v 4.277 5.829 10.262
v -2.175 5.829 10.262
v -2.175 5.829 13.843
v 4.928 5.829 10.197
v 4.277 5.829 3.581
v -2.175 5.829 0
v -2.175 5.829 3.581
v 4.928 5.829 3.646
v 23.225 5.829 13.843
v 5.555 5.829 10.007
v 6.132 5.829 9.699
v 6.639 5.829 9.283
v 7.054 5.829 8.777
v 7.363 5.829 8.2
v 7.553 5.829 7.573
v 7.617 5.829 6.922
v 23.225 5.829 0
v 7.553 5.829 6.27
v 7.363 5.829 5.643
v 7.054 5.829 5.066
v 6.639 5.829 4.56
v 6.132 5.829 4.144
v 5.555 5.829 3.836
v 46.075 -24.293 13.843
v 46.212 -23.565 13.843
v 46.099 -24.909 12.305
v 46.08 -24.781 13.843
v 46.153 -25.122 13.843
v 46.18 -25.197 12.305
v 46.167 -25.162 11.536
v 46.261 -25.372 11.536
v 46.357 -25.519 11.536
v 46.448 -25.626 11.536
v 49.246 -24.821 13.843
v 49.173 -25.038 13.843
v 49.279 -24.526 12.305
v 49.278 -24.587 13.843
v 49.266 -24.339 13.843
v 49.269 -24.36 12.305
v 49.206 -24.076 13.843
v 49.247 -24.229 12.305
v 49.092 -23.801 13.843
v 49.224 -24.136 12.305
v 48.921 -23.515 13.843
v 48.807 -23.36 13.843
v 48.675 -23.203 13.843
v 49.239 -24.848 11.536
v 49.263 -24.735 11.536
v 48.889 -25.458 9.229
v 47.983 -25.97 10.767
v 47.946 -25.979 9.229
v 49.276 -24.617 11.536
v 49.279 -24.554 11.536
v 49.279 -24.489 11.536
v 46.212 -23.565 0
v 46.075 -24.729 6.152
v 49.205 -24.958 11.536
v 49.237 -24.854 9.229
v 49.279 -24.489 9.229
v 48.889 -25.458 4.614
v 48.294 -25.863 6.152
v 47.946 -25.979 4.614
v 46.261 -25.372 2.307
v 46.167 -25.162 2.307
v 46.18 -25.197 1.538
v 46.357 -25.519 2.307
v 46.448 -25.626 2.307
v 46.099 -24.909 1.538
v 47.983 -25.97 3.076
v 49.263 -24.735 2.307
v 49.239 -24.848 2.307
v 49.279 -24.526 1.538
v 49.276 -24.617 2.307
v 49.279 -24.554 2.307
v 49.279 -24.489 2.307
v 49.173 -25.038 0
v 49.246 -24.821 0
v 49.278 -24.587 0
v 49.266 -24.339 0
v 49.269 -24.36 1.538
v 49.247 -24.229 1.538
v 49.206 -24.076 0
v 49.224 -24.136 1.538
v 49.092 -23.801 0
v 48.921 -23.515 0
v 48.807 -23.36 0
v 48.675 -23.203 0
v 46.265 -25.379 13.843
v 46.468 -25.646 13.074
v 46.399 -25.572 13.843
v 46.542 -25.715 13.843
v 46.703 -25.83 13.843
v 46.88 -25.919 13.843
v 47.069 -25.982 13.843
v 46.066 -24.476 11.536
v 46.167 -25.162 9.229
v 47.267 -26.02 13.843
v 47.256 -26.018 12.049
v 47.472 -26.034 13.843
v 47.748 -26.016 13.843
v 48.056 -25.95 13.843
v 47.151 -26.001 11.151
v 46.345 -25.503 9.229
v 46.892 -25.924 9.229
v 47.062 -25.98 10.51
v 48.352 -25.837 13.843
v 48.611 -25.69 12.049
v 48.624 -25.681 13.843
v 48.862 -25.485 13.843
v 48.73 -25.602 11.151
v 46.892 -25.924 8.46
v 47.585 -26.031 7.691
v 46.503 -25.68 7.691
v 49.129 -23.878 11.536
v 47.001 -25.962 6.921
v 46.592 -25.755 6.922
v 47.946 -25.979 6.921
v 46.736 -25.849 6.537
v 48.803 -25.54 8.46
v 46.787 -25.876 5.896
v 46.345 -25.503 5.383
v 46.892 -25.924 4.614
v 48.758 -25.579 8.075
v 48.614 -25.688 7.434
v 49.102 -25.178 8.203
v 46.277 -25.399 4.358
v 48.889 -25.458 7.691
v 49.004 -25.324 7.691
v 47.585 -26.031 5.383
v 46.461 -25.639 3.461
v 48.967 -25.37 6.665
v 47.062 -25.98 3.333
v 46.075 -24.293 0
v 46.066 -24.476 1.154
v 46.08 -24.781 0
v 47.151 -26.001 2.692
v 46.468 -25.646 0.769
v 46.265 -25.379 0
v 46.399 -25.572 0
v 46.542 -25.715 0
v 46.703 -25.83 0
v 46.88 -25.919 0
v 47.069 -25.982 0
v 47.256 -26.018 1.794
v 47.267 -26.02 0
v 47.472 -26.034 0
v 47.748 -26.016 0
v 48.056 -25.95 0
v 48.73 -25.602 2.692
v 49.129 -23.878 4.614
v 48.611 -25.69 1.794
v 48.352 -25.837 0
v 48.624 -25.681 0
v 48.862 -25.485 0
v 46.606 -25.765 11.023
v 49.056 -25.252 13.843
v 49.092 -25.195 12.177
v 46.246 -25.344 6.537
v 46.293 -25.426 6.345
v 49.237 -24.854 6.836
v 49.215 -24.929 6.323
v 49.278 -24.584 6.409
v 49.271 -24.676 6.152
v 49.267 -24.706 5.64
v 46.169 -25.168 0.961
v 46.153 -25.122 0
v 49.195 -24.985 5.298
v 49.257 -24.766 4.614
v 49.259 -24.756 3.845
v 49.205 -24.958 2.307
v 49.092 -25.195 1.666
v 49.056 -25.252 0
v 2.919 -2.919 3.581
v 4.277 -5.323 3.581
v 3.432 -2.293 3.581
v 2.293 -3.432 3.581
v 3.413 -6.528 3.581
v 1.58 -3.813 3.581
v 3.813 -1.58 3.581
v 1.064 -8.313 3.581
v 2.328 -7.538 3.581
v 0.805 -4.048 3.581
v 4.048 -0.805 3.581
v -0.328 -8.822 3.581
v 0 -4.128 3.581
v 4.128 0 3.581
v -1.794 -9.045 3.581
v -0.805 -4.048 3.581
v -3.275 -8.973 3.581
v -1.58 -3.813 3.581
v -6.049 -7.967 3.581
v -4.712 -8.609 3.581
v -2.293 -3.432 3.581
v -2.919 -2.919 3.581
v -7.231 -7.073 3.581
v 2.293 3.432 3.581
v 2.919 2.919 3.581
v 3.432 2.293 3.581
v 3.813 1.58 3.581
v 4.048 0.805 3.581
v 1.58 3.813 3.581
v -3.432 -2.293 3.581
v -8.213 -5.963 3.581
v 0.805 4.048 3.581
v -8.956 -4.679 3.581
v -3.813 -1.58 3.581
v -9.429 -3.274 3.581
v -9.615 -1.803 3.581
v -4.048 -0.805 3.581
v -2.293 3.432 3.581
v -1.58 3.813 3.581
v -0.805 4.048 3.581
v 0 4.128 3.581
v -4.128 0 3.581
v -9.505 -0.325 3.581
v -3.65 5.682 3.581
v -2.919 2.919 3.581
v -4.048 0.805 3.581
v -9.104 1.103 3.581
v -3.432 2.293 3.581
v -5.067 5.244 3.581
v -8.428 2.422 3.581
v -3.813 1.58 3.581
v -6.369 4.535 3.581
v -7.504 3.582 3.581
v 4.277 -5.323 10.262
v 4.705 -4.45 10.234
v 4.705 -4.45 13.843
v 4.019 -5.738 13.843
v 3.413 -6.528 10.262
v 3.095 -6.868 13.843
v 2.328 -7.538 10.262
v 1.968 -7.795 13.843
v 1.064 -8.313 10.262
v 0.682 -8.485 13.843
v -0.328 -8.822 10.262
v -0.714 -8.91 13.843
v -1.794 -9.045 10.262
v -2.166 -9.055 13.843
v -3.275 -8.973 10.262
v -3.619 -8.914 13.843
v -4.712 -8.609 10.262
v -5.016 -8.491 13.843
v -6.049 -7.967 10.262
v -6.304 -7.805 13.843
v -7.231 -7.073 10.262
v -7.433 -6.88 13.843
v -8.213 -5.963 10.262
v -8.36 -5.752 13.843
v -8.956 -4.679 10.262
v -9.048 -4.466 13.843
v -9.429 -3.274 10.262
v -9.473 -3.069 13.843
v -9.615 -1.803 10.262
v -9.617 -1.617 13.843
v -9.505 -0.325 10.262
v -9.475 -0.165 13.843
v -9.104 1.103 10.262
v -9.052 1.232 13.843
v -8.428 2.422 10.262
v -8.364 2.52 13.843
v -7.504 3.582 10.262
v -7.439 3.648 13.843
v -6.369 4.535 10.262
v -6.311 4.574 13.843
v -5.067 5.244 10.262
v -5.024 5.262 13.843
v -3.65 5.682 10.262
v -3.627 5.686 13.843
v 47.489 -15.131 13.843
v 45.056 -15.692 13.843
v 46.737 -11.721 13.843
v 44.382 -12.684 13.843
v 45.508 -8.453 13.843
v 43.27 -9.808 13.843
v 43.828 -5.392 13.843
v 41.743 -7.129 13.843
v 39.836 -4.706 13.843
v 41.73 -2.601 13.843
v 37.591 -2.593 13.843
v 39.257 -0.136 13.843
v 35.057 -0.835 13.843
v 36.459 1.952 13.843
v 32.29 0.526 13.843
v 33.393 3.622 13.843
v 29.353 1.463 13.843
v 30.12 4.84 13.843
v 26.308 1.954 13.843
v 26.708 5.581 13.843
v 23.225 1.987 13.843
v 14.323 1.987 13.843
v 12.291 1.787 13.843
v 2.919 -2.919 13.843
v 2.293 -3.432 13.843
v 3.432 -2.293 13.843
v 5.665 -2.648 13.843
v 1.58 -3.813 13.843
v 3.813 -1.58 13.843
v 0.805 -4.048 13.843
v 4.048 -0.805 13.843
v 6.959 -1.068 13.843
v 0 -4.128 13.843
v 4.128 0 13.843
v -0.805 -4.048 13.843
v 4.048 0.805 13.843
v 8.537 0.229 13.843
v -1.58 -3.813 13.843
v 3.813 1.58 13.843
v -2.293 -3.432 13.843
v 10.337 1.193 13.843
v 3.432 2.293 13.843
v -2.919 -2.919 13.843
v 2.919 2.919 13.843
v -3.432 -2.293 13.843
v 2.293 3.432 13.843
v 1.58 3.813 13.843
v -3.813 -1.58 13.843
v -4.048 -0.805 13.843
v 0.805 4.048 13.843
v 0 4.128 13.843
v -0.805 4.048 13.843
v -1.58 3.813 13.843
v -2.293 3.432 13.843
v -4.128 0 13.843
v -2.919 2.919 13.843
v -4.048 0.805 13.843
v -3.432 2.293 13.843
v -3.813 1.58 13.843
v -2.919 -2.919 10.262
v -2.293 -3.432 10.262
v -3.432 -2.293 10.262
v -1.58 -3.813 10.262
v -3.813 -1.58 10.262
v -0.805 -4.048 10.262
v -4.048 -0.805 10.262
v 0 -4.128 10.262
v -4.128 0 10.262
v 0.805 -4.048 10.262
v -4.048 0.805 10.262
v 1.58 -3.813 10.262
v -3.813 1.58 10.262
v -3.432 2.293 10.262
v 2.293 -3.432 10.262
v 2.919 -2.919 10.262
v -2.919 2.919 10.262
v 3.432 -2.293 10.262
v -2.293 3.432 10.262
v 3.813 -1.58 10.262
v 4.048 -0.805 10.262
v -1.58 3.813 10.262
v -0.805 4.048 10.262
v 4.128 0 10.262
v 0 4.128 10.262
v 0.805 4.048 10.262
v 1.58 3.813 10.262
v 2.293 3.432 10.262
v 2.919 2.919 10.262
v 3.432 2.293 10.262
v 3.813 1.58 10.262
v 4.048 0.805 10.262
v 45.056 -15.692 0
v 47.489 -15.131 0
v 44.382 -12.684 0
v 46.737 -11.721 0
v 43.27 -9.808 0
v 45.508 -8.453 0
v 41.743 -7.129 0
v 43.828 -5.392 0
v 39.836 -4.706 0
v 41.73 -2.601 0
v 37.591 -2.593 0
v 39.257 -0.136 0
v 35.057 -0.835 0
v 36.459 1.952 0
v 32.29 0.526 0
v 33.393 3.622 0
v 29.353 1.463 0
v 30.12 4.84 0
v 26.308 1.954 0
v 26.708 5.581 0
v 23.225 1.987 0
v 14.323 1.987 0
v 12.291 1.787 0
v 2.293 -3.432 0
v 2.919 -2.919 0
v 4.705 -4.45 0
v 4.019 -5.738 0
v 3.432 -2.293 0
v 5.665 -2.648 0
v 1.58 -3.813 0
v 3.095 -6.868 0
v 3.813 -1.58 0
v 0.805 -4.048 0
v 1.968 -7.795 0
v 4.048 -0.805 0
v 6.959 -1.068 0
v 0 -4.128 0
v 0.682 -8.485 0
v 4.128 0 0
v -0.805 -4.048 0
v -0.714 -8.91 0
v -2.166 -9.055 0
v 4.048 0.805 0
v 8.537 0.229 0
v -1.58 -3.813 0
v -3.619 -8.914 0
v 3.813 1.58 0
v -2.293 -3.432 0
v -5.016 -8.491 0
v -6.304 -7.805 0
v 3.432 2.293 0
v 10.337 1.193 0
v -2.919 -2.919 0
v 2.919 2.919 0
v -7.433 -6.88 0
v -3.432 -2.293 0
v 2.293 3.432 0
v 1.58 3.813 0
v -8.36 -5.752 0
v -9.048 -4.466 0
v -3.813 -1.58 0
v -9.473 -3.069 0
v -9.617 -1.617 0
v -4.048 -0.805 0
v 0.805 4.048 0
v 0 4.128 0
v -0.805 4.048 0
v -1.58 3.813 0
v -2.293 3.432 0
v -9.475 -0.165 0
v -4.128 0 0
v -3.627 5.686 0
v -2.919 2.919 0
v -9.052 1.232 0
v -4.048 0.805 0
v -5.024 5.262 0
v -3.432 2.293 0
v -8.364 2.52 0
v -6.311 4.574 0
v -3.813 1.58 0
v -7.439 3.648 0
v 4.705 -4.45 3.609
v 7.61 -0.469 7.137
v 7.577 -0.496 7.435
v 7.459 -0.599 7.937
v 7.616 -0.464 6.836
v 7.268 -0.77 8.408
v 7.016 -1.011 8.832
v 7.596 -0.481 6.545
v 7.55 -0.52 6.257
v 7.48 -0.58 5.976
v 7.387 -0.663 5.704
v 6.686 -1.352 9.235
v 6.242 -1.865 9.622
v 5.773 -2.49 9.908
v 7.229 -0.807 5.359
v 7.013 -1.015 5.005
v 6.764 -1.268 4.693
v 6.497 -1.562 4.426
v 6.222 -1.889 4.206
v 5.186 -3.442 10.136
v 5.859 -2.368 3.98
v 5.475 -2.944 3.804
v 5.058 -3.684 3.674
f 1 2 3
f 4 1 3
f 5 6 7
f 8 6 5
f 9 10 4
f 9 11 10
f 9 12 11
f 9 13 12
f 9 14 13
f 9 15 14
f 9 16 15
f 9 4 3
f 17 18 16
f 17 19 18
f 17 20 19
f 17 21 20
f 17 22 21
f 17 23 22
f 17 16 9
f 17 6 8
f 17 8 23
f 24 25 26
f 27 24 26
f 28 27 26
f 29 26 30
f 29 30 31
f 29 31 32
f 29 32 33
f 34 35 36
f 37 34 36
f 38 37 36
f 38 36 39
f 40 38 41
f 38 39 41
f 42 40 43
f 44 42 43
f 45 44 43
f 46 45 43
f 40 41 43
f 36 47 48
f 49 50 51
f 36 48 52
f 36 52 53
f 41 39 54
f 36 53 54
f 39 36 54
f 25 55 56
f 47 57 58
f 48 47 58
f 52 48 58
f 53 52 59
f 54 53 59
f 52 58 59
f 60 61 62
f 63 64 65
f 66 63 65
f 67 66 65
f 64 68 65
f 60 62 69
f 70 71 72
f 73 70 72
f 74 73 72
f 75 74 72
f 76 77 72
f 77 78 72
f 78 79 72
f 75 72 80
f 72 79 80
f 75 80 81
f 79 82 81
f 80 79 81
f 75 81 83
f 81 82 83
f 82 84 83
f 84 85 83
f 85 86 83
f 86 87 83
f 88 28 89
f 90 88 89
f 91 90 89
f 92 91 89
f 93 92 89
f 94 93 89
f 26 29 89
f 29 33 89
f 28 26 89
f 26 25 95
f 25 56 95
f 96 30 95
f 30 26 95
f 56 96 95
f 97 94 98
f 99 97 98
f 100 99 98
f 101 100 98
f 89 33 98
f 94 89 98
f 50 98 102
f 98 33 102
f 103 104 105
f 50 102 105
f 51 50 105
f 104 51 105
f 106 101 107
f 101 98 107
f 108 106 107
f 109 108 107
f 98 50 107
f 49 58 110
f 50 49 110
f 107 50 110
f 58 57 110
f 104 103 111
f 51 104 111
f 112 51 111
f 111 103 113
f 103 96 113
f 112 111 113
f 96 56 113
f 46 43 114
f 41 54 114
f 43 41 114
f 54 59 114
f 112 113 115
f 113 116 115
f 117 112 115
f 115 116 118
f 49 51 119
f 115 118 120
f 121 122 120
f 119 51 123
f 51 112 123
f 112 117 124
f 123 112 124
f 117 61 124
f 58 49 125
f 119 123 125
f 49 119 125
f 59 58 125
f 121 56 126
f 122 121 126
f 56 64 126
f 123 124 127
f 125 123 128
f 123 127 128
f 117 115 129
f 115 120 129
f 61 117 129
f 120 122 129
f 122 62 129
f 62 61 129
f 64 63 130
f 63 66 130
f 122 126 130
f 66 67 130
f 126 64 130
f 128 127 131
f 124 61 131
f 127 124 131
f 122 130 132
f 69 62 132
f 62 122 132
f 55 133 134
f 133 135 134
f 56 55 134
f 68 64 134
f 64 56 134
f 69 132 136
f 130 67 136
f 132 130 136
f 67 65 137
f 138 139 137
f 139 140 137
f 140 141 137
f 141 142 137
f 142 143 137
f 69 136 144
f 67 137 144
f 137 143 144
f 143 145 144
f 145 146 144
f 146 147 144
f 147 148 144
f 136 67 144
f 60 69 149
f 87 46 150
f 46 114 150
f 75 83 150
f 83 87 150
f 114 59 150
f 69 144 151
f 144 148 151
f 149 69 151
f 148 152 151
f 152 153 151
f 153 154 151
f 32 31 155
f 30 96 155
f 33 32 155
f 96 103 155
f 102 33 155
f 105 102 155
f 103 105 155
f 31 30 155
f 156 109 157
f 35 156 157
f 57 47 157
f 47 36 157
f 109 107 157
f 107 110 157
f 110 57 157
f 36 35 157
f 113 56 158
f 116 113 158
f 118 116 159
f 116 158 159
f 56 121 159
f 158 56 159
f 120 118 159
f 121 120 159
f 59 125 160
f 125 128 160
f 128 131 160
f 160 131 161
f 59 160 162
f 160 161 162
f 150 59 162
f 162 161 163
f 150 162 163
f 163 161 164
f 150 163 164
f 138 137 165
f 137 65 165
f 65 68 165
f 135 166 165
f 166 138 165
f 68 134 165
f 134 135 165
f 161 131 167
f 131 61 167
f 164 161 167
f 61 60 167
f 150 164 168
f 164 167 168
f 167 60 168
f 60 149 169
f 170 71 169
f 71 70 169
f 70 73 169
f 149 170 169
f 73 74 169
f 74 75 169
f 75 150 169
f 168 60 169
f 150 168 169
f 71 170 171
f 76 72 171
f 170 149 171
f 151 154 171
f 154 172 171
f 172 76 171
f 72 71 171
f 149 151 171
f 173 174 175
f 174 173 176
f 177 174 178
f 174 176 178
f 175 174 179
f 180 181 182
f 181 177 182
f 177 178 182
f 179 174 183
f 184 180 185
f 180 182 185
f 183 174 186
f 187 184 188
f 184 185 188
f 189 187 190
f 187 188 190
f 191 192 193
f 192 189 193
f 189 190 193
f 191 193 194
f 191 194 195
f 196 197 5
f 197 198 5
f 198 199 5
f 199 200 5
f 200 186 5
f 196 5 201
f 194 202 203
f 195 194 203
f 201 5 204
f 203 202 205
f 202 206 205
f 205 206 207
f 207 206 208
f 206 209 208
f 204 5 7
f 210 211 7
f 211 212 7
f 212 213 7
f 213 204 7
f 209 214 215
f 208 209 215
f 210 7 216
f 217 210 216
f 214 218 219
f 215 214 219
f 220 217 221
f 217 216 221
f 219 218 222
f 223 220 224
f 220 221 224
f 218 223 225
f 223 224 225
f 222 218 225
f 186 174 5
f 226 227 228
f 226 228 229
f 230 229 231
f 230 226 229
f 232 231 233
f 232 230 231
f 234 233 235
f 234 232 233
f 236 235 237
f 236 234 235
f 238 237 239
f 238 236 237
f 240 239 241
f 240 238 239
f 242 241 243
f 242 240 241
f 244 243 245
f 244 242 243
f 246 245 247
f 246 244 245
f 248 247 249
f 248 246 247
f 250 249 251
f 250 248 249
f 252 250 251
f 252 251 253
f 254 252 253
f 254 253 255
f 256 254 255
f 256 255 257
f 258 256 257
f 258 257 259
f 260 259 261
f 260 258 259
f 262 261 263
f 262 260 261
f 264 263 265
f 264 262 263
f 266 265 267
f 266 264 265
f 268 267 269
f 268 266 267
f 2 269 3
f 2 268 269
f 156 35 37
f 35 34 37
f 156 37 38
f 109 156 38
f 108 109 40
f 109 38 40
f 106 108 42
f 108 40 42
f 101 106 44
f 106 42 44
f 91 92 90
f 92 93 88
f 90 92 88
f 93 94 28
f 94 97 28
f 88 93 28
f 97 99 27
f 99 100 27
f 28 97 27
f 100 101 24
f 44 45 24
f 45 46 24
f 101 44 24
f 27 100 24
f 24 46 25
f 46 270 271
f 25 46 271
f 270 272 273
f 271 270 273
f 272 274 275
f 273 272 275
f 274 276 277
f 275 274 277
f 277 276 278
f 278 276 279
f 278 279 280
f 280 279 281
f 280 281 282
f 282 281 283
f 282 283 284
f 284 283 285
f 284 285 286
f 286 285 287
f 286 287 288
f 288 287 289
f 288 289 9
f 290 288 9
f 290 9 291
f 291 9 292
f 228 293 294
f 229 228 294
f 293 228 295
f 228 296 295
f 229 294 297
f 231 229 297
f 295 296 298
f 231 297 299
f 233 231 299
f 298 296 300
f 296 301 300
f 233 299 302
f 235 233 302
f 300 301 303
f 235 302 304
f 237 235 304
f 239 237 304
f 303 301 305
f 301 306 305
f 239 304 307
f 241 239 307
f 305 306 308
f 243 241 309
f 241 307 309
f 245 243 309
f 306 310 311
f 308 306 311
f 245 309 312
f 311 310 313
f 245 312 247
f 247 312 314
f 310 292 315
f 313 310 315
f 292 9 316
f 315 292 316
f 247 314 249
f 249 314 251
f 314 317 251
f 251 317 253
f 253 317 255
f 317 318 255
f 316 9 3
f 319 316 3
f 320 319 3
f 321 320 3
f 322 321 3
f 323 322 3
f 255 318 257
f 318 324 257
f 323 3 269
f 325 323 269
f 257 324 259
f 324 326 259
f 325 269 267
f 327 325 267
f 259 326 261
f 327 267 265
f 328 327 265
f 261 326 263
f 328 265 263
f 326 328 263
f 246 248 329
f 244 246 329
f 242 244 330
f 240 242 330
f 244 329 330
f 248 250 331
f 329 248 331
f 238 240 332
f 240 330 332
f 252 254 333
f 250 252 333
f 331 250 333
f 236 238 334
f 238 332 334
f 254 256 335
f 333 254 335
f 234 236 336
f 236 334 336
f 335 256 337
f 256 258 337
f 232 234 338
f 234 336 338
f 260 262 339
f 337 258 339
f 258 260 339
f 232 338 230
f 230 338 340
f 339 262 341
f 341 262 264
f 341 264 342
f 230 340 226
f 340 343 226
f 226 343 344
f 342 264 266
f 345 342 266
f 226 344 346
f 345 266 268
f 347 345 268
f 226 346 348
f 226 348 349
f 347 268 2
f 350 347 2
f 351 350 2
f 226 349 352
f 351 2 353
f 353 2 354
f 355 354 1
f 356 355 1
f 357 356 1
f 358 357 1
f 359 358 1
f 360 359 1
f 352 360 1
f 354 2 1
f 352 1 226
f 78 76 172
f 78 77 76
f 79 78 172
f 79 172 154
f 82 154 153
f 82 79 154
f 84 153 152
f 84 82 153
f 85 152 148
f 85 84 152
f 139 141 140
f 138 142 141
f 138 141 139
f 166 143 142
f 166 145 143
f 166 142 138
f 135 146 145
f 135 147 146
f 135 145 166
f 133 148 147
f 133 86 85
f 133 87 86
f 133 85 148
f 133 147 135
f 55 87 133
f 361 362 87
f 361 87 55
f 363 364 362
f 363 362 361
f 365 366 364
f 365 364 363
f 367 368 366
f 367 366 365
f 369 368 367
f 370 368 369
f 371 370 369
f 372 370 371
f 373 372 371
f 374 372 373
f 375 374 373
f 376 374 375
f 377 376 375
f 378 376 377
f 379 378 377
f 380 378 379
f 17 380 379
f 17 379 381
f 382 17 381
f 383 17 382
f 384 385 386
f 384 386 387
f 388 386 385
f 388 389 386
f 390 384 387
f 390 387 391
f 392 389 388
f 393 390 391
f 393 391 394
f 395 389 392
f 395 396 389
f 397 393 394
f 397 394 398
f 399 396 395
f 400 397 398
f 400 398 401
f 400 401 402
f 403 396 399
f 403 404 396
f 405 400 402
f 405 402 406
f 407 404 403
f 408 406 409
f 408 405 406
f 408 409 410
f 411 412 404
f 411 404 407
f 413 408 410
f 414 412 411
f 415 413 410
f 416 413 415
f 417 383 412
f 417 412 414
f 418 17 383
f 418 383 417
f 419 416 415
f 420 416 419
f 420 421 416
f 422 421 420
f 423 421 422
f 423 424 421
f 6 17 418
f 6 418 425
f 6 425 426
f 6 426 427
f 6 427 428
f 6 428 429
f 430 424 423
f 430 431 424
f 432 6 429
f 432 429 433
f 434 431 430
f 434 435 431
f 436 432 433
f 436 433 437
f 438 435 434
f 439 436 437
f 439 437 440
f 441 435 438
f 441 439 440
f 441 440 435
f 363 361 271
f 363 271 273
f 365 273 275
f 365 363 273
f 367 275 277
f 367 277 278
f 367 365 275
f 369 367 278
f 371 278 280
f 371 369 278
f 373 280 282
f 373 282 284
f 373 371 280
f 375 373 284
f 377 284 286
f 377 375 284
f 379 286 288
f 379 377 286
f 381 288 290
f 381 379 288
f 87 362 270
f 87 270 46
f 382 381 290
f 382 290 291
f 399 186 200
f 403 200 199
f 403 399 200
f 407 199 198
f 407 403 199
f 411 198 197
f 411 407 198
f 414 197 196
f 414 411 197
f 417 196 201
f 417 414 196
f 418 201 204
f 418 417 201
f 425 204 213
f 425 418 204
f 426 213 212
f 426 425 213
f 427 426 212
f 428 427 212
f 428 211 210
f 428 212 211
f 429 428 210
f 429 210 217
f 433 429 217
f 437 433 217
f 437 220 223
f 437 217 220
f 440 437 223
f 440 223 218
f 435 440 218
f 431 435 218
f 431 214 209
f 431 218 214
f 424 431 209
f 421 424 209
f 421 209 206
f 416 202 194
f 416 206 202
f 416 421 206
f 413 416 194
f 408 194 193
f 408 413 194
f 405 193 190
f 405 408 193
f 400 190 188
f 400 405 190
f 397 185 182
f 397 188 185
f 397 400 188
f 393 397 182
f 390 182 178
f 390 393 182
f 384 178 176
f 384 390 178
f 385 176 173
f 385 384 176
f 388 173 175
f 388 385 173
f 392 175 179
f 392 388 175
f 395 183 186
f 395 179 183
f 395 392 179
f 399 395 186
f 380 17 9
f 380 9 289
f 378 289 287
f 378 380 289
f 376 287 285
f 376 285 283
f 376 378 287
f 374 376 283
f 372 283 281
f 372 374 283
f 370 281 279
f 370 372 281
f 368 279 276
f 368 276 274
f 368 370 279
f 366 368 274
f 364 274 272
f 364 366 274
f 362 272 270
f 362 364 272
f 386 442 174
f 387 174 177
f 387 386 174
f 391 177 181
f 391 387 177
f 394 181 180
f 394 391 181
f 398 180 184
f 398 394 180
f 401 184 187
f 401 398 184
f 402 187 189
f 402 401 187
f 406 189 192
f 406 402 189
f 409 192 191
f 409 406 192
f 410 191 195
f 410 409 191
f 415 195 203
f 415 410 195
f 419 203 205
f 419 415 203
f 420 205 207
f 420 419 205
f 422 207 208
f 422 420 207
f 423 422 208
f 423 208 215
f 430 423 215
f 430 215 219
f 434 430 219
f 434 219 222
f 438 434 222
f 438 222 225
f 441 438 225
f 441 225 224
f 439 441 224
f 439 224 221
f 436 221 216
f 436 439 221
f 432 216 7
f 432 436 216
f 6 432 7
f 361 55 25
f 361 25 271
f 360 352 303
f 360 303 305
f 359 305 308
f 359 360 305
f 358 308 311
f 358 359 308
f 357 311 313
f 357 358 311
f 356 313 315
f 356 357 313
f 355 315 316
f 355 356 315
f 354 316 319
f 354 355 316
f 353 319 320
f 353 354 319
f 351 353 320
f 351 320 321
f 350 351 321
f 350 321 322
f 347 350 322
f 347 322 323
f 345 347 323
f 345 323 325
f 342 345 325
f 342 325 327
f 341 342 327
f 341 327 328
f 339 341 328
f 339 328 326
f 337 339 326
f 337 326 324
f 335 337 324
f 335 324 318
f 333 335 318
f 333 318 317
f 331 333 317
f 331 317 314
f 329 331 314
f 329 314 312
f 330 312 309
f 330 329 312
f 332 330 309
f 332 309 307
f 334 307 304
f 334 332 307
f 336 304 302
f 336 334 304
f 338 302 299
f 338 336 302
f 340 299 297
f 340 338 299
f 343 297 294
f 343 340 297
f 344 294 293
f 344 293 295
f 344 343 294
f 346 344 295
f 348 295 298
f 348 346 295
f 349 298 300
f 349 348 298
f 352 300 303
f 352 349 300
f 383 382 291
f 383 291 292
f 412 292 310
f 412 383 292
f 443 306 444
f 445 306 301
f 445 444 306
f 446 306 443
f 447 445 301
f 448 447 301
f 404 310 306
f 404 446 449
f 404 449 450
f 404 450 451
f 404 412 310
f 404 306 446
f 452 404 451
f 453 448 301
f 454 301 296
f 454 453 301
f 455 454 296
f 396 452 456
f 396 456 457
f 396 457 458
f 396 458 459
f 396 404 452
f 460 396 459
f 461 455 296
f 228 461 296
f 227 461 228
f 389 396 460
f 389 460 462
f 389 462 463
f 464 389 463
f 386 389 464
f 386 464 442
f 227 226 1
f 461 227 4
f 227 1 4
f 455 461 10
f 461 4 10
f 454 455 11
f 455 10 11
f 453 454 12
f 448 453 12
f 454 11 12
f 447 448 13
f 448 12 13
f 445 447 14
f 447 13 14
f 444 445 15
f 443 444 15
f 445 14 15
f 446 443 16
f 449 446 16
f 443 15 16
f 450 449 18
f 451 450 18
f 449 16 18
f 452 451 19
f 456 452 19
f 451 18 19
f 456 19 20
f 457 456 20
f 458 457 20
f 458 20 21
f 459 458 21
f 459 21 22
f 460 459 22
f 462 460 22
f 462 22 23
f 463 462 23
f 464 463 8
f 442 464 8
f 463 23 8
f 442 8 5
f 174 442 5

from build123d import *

# Parameters (mm, degrees)
SKETCH1_R           = 4.1275
BOSS_EXTRUDE1_DEPTH = 13.843
CUT_EXTRUDE1_DEPTH  = 21.463


with BuildPart() as part:
    # Sketch1 → Boss-Extrude1 (new body)
    with BuildSketch(Plane.XY):
        with BuildLine():
            Line((-2.174766514, 5.8293), (23.225233486, 5.8293))
            ThreePointArc((23.225233486, 5.8293), (39.256887261, -0.136207699), (47.489215864, -15.130538982))
            Line((47.489215864, -15.130538982), (48.675112128, -23.2029))
            add(Edge.make_bspline(
                [(46.212346009, -23.56470061), (45.056877099, -27.681849857), (51.170161996, -26.006789114), (48.675112128, -23.2029)],
                knots=[0, 0, 0, 0, 1, 1, 1, 1], degree=3))
            Line((46.212346009, -23.56470061), (45.055850098, -15.692466932))
            ThreePointArc((45.055850098, -15.692466932), (37.59061151, -2.592519956), (23.225233486, 1.98725211))
            Line((23.225233486, 1.98725211), (14.323446957, 1.98725211))
            ThreePointArc((14.323446957, 1.98725211), (8.536644874, 0.229383426), (4.70535824, -4.450191704))
            ThreePointArc((4.70535824, -4.450191704), (-8.359507137, -5.752383574), (-2.174766514, 5.8293))
        make_face()
        Circle(SKETCH1_R, mode=Mode.SUBTRACT)
    extrude(amount=BOSS_EXTRUDE1_DEPTH)

    # Sketch2 → Cut-Extrude1 (cut)
    with BuildSketch(Plane(origin=(0, 5.8293, 0), x_dir=(1, 0, 0), z_dir=(0, 1, 0))):
        with BuildLine():
            Line((4.276833486, -3.5814), (-9.616966514, -3.5814))
            Line((-9.616966514, -3.5814), (-9.616966514, -10.2616))
            Line((-9.616966514, -10.2616), (4.276833486, -10.2616))
            ThreePointArc((4.276833486, -10.2616), (7.616933486, -6.9215), (4.276833486, -3.5814))
        make_face()
    extrude(amount=-CUT_EXTRUDE1_DEPTH, mode=Mode.SUBTRACT)


solid = part.part
